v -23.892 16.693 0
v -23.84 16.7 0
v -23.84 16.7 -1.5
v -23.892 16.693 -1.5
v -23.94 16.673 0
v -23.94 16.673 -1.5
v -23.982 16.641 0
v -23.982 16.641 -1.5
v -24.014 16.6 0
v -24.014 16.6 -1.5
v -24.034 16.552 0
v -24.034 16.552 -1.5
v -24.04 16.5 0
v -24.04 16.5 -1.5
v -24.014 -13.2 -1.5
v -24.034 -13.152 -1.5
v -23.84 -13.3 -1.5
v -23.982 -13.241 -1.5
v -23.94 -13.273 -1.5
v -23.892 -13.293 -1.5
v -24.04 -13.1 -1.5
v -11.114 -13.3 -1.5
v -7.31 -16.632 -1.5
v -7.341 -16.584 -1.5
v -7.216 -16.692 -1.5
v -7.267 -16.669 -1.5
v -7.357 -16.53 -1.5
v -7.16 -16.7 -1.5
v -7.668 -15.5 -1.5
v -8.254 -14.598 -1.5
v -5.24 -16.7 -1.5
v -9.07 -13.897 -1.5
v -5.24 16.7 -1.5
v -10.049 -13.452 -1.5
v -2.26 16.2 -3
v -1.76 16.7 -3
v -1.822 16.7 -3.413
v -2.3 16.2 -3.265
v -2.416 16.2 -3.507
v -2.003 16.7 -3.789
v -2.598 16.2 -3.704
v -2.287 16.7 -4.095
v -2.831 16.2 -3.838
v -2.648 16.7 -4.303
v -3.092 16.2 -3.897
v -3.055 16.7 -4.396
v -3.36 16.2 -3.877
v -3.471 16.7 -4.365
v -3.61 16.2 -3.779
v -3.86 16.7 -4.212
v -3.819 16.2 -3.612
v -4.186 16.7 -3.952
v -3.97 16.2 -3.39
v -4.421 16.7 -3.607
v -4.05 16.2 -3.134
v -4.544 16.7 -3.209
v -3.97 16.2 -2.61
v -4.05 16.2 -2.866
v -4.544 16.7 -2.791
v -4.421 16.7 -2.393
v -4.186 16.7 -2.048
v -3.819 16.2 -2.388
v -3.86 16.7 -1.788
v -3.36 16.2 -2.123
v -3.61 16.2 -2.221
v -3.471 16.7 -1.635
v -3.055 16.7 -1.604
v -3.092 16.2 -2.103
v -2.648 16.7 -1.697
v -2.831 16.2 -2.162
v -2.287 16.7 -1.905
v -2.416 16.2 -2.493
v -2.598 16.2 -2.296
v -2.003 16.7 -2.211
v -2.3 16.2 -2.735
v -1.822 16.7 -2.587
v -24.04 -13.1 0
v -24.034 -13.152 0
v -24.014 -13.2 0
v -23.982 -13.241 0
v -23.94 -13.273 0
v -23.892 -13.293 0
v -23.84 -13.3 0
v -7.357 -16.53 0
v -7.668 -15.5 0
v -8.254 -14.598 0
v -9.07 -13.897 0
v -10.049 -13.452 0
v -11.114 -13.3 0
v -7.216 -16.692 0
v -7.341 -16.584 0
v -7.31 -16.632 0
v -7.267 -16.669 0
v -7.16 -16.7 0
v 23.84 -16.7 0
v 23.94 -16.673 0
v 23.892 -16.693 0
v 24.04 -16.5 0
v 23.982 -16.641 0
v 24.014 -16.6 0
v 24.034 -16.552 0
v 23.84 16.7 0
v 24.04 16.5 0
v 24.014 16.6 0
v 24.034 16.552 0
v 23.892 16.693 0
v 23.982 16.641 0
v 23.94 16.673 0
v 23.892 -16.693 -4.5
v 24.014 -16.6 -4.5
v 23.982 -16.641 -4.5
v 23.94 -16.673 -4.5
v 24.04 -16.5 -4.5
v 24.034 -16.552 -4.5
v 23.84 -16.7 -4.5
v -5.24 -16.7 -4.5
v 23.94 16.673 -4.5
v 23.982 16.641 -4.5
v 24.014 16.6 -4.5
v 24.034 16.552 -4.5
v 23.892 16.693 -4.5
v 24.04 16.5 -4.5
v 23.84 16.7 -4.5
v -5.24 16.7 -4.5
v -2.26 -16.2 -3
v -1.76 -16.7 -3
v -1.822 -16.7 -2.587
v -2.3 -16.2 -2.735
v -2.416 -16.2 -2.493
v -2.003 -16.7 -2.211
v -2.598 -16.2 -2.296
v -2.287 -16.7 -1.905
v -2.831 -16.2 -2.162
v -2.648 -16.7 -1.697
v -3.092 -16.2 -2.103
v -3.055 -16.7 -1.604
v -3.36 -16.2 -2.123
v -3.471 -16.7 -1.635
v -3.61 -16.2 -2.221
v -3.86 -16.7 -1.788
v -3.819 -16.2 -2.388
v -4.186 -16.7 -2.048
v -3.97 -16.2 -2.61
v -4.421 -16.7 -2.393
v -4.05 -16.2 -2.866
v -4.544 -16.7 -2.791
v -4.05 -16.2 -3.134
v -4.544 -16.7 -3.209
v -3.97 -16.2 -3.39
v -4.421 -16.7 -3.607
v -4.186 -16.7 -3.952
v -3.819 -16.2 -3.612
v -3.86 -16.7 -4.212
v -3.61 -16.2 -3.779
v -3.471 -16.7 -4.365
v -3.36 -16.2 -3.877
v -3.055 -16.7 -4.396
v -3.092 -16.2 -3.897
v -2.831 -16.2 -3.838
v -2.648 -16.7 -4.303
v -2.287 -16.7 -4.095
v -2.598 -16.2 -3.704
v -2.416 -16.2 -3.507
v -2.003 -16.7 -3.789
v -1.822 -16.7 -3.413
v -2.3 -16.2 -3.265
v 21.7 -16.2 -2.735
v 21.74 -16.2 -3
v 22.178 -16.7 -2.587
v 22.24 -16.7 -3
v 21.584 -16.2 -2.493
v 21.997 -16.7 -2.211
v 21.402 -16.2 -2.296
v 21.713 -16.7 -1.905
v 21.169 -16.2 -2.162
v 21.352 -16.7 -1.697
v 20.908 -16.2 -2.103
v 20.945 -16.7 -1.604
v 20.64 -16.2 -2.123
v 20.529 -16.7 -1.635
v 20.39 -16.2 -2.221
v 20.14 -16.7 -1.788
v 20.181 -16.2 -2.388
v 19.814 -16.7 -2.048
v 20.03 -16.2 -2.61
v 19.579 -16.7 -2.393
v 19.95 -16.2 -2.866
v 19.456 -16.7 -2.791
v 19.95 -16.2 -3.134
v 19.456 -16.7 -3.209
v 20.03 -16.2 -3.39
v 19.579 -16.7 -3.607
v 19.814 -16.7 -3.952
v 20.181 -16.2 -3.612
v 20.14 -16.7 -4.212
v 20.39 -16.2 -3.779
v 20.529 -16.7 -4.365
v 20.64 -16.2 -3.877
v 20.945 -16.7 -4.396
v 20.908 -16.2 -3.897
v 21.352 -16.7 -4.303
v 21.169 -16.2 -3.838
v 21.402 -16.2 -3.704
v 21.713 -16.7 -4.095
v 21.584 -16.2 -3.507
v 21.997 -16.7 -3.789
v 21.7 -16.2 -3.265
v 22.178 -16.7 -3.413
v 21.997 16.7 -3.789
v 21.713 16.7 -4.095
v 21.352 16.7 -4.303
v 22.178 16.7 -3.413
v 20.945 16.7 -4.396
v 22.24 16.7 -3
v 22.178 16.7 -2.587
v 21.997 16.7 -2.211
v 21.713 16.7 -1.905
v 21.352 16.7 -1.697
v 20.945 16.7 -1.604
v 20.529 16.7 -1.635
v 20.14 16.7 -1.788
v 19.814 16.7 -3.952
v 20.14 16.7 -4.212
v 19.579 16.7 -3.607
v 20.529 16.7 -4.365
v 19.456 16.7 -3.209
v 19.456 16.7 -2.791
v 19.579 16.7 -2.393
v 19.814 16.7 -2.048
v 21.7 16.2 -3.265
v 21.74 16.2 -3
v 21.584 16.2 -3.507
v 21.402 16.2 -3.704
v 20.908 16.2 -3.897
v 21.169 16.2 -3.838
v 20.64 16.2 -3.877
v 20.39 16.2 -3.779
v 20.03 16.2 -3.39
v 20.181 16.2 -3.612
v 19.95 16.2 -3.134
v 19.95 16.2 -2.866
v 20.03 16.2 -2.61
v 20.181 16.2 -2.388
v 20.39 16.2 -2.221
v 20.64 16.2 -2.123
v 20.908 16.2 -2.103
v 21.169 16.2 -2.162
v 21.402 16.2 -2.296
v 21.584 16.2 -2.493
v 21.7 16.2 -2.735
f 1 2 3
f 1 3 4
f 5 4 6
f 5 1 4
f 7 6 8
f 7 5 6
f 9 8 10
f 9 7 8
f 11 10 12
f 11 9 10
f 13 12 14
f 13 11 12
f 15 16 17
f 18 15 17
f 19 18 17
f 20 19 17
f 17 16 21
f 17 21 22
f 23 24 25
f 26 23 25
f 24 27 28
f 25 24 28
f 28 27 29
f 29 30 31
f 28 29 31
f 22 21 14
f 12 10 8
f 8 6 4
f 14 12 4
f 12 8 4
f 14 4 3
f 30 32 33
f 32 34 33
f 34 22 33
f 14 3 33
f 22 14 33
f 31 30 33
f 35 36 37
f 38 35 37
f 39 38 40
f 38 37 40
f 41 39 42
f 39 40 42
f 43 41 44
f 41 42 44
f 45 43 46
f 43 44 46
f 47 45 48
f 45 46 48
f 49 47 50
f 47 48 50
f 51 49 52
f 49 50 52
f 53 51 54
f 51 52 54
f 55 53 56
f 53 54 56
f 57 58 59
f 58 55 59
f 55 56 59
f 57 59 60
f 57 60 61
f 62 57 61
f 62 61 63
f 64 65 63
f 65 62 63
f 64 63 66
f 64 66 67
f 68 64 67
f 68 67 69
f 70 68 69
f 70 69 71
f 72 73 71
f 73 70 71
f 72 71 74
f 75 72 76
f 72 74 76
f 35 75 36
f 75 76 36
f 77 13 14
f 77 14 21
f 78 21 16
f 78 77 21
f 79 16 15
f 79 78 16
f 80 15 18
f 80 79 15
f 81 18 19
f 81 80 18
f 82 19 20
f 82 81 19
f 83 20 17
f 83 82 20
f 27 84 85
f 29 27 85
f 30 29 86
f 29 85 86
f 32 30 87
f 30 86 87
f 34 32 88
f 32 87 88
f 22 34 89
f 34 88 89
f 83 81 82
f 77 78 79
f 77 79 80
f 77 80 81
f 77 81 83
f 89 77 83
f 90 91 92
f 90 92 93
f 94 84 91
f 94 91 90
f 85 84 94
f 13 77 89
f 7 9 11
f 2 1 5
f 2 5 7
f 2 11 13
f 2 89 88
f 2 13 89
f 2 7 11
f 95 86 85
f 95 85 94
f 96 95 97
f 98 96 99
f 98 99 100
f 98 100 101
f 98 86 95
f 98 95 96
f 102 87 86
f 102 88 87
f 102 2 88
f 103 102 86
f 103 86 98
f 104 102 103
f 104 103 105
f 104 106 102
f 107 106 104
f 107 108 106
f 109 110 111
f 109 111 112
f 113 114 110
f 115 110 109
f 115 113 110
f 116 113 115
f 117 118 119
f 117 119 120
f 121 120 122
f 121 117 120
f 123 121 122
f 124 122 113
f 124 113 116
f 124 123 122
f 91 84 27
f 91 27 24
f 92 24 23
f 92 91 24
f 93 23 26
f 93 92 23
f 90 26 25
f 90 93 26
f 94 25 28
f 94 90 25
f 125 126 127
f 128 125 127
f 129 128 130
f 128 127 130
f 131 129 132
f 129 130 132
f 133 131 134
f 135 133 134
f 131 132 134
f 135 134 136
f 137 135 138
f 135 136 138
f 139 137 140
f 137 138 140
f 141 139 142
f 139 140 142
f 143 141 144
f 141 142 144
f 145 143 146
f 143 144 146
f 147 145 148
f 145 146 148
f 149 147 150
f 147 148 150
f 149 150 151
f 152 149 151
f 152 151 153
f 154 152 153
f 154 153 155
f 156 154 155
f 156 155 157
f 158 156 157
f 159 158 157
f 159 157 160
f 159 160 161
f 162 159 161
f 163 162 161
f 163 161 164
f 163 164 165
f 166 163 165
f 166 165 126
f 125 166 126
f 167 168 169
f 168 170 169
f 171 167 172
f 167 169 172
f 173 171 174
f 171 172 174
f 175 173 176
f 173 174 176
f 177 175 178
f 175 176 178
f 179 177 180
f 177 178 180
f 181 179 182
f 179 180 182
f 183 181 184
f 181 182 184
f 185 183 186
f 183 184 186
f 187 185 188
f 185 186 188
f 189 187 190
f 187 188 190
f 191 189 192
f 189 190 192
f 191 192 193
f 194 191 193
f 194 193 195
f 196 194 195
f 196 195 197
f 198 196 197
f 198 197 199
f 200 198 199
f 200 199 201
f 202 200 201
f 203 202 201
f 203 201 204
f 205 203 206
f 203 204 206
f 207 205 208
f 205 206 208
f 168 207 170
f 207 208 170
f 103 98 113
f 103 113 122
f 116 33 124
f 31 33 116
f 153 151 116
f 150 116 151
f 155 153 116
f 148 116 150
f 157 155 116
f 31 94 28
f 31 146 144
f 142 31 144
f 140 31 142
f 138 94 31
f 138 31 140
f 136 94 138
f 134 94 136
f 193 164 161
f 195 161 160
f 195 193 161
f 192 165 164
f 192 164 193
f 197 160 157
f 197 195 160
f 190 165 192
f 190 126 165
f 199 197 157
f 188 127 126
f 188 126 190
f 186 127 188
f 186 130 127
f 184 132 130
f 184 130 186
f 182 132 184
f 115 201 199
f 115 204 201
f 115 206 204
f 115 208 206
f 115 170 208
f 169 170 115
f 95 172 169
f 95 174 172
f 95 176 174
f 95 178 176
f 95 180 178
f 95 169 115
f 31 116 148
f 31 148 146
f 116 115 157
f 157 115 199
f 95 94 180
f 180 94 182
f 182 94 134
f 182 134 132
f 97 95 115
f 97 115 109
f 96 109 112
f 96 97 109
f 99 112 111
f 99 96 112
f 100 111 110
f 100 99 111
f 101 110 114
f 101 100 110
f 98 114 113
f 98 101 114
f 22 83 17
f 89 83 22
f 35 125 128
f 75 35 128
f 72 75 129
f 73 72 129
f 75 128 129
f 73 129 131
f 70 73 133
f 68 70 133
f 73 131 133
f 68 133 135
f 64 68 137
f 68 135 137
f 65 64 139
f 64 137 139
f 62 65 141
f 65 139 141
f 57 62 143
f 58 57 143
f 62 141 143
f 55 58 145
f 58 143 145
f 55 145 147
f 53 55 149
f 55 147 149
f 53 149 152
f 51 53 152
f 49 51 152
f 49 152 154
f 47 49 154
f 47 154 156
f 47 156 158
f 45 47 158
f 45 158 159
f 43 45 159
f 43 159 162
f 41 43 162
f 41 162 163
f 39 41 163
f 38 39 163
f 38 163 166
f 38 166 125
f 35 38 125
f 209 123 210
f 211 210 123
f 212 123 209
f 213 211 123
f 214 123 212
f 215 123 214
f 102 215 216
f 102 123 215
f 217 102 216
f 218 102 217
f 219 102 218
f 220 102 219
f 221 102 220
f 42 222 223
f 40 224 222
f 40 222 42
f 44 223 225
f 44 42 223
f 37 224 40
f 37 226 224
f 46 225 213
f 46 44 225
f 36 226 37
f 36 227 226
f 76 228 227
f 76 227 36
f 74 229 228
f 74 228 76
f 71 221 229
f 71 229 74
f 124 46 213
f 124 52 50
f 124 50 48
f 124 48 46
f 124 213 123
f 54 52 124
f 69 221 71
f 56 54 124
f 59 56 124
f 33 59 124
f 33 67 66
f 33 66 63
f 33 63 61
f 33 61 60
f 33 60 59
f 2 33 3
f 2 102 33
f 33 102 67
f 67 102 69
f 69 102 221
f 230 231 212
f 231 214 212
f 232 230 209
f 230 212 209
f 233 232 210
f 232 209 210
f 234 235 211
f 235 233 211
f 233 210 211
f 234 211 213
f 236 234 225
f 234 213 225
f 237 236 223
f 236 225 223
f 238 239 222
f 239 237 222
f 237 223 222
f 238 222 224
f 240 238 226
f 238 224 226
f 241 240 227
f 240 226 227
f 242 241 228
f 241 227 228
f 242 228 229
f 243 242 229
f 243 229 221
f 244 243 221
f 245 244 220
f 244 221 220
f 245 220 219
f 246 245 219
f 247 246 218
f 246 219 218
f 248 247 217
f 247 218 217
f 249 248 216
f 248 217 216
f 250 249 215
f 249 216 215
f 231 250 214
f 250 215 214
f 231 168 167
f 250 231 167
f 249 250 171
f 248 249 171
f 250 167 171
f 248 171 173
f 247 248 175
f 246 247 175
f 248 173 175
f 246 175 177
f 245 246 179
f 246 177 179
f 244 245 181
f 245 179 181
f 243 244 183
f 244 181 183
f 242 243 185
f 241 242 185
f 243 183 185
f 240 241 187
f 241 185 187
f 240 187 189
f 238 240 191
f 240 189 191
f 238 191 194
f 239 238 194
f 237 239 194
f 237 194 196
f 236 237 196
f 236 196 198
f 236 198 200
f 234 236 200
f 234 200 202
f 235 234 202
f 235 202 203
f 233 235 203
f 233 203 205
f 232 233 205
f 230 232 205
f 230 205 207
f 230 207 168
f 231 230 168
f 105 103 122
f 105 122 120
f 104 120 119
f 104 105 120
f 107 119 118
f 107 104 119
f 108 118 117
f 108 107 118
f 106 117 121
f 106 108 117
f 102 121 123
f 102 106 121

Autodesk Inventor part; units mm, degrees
ref_plane "YZ Plane" through (0, 0, 0) normal (1, 0, 0) x (0, 1, 0)
ref_plane "XZ Plane" through (0, 0, 0) normal (0, 1, 0) x (-1, 0, 0)
ref_plane "XY Plane" through (0, 0, 0) normal (0, 0, 1) x (1, 0, 0)
sketch "Skizze1" plane through (0, 0, 0) normal (0, 0, 1) x (1, 0, 0)
  line L0 (-7.1596, -18.5) -> (23.8404, -18.5) projected
  arc A0 (23.8404, -18.5) -> (25.8404, -16.5) centre (23.8404, -16.5) ccw projected
  line L1 (25.8404, -16.5) -> (25.8404, 16.5) projected
  arc A1 (25.8404, 16.5) -> (23.8404, 18.5) centre (23.8404, 16.5) ccw projected
  line L2 (23.8404, 18.5) -> (-23.8404, 18.5) projected
  arc A2 (-23.8404, 18.5) -> (-25.8404, 16.5) centre (-23.8404, 16.5) ccw projected
  line L3 (-25.8404, 16.5) -> (-25.8404, -13.1) projected
  arc A3 (-25.8404, -13.1) -> (-23.8404, -15.1) centre (-23.8404, -13.1) ccw projected
  line L4 (-23.8404, -15.1) -> (-11.1143, -15.1) projected
  arc A4 (-9.1369, -16.8) -> (-11.1143, -15.1) centre (-11.1143, -17.1) ccw projected
  arc A5 (-9.1369, -16.8) -> (-7.1596, -18.5) centre (-7.1596, -16.5) ccw projected
  line L5 (-24.3404, -13.1) -> (-24.3404, 16.5) projected
  arc A6 (-23.8404, 17) -> (-24.3404, 16.5) centre (-23.8404, 16.5) ccw projected
  line L6 (-23.8404, 17) -> (23.8404, 17) projected
  arc A7 (24.3404, 16.5) -> (23.8404, 17) centre (23.8404, 16.5) ccw projected
  line L7 (24.3404, 16.5) -> (24.3404, -16.5) projected
  arc A8 (23.8404, -17) -> (24.3404, -16.5) centre (23.8404, -16.5) ccw projected
  line L8 (23.8404, -17) -> (-7.1596, -17) projected
  arc A9 (-7.6539, -16.575) -> (-7.1596, -17) centre (-7.1596, -16.5) ccw projected
  arc A10 (-7.6539, -16.575) -> (-11.1143, -13.6) centre (-11.1143, -17.1) ccw projected
  line L9 (-11.1143, -13.6) -> (-23.8404, -13.6) projected
  arc A11 (-24.3404, -13.1) -> (-23.8404, -13.6) centre (-23.8404, -13.1) ccw projected
  line L10 (23.8404, 16.7) -> (-23.8404, 16.7)
  arc A12 (-23.8404, 16.7) -> (-24.0404, 16.5) centre (-23.8404, 16.5) ccw
  line L11 (-24.0404, 16.5) -> (-24.0404, -13.1)
  arc A13 (-24.0404, -13.1) -> (-23.8404, -13.3) centre (-23.8404, -13.1) ccw
  line L12 (-23.8404, -13.3) -> (-11.1143, -13.3)
  arc A14 (-7.3573, -16.53) -> (-11.1143, -13.3) centre (-11.1143, -17.1) ccw
  arc A15 (-7.3573, -16.53) -> (-7.1596, -16.7) centre (-7.1596, -16.5) ccw
  line L13 (-7.1596, -16.7) -> (23.8404, -16.7)
  arc A16 (23.8404, -16.7) -> (24.0404, -16.5) centre (23.8404, -16.5) ccw
  line L14 (24.0404, -16.5) -> (24.0404, 16.5)
  arc A17 (24.0404, 16.5) -> (23.8404, 16.7) centre (23.8404, 16.5) ccw
  point P0 (0, 0)
  dimension "d0" = 0.3
extrude "Extrusion1" add sketch "Skizze1" against normal blind 1.5 contours A17 L14 A16 L13 A15 A14 L12 A13 L11 A12 L10
sketch "Skizze2" plane through (0, 0, -1.5) normal (0, 0, -1) x (-1, 0, 0)
  line L0 (6.2404, -13.1) -> (6.2404, 16.5) projected
  arc A0 (11.1143, -13.3) -> (7.3573, -16.53) centre (11.1143, -17.1) ccw projected
  arc A1 (7.1596, -16.7) -> (7.3573, -16.53) centre (7.1596, -16.5) ccw projected
  line L1 (7.1596, -16.7) -> (-23.8404, -16.7) projected
  arc A2 (-24.0404, -16.5) -> (-23.8404, -16.7) centre (-23.8404, -16.5) ccw projected
  line L2 (-24.0404, -16.5) -> (-24.0404, 16.5) projected
  arc A3 (-23.8404, 16.7) -> (-24.0404, 16.5) centre (-23.8404, 16.5) ccw projected
  line L3 (-23.8404, 16.7) -> (23.8404, 16.7) projected
  arc A4 (24.0404, 16.5) -> (23.8404, 16.7) centre (23.8404, 16.5) ccw projected
  line L4 (24.0404, 16.5) -> (24.0404, -13.1) projected
  arc A5 (23.8404, -13.3) -> (24.0404, -13.1) centre (23.8404, -13.1) ccw projected
  line L5 (23.8404, -13.3) -> (11.1143, -13.3) projected
  line L6 (5.2404, -37.9441) -> (-28.2922, -37.9441)
  line L7 (-28.2922, -37.9441) -> (-28.2922, 30.637)
  line L8 (-28.2922, 30.637) -> (5.2404, 30.637)
  line L9 (5.2404, 30.637) -> (5.2404, -37.9441)
  point P0 (0, 0)
  point P1 (5.2404, -16.7)
  point P2 (5.2404, 16.7)
  dimension "d3" = 1
extrude "Extrusion2" add sketch "Skizze2" along normal blind 3 contours L1 A2 L2 A3 L3 L9
sketch "Skizze3" plane through (-7.1596, -16.7, 0) normal (0, -1, 0) x (1, 0, 0)
  circle A0 centre (28, -3) radius 2 projected
  circle A1 centre (4, -3) radius 2 projected
  circle A2 centre (28, -3) radius 0.9
  circle A3 centre (4, -3) radius 0.9
  point P0 (7.1596, 0)
  dimension "d6" = 1.8
  dimension "d7" = 1.8
extrude "Extrusion3" cut sketch "Skizze3" against normal through all contours A2 | A3
chamfer "Fase1" distance 0.5 angle 45 4 edges at (-4.0596, 16.7, -3) (19.9404, 16.7, -3) (19.9404, -16.7, -3) (-4.0596, -16.7, -3)
properties part number "Boden"
